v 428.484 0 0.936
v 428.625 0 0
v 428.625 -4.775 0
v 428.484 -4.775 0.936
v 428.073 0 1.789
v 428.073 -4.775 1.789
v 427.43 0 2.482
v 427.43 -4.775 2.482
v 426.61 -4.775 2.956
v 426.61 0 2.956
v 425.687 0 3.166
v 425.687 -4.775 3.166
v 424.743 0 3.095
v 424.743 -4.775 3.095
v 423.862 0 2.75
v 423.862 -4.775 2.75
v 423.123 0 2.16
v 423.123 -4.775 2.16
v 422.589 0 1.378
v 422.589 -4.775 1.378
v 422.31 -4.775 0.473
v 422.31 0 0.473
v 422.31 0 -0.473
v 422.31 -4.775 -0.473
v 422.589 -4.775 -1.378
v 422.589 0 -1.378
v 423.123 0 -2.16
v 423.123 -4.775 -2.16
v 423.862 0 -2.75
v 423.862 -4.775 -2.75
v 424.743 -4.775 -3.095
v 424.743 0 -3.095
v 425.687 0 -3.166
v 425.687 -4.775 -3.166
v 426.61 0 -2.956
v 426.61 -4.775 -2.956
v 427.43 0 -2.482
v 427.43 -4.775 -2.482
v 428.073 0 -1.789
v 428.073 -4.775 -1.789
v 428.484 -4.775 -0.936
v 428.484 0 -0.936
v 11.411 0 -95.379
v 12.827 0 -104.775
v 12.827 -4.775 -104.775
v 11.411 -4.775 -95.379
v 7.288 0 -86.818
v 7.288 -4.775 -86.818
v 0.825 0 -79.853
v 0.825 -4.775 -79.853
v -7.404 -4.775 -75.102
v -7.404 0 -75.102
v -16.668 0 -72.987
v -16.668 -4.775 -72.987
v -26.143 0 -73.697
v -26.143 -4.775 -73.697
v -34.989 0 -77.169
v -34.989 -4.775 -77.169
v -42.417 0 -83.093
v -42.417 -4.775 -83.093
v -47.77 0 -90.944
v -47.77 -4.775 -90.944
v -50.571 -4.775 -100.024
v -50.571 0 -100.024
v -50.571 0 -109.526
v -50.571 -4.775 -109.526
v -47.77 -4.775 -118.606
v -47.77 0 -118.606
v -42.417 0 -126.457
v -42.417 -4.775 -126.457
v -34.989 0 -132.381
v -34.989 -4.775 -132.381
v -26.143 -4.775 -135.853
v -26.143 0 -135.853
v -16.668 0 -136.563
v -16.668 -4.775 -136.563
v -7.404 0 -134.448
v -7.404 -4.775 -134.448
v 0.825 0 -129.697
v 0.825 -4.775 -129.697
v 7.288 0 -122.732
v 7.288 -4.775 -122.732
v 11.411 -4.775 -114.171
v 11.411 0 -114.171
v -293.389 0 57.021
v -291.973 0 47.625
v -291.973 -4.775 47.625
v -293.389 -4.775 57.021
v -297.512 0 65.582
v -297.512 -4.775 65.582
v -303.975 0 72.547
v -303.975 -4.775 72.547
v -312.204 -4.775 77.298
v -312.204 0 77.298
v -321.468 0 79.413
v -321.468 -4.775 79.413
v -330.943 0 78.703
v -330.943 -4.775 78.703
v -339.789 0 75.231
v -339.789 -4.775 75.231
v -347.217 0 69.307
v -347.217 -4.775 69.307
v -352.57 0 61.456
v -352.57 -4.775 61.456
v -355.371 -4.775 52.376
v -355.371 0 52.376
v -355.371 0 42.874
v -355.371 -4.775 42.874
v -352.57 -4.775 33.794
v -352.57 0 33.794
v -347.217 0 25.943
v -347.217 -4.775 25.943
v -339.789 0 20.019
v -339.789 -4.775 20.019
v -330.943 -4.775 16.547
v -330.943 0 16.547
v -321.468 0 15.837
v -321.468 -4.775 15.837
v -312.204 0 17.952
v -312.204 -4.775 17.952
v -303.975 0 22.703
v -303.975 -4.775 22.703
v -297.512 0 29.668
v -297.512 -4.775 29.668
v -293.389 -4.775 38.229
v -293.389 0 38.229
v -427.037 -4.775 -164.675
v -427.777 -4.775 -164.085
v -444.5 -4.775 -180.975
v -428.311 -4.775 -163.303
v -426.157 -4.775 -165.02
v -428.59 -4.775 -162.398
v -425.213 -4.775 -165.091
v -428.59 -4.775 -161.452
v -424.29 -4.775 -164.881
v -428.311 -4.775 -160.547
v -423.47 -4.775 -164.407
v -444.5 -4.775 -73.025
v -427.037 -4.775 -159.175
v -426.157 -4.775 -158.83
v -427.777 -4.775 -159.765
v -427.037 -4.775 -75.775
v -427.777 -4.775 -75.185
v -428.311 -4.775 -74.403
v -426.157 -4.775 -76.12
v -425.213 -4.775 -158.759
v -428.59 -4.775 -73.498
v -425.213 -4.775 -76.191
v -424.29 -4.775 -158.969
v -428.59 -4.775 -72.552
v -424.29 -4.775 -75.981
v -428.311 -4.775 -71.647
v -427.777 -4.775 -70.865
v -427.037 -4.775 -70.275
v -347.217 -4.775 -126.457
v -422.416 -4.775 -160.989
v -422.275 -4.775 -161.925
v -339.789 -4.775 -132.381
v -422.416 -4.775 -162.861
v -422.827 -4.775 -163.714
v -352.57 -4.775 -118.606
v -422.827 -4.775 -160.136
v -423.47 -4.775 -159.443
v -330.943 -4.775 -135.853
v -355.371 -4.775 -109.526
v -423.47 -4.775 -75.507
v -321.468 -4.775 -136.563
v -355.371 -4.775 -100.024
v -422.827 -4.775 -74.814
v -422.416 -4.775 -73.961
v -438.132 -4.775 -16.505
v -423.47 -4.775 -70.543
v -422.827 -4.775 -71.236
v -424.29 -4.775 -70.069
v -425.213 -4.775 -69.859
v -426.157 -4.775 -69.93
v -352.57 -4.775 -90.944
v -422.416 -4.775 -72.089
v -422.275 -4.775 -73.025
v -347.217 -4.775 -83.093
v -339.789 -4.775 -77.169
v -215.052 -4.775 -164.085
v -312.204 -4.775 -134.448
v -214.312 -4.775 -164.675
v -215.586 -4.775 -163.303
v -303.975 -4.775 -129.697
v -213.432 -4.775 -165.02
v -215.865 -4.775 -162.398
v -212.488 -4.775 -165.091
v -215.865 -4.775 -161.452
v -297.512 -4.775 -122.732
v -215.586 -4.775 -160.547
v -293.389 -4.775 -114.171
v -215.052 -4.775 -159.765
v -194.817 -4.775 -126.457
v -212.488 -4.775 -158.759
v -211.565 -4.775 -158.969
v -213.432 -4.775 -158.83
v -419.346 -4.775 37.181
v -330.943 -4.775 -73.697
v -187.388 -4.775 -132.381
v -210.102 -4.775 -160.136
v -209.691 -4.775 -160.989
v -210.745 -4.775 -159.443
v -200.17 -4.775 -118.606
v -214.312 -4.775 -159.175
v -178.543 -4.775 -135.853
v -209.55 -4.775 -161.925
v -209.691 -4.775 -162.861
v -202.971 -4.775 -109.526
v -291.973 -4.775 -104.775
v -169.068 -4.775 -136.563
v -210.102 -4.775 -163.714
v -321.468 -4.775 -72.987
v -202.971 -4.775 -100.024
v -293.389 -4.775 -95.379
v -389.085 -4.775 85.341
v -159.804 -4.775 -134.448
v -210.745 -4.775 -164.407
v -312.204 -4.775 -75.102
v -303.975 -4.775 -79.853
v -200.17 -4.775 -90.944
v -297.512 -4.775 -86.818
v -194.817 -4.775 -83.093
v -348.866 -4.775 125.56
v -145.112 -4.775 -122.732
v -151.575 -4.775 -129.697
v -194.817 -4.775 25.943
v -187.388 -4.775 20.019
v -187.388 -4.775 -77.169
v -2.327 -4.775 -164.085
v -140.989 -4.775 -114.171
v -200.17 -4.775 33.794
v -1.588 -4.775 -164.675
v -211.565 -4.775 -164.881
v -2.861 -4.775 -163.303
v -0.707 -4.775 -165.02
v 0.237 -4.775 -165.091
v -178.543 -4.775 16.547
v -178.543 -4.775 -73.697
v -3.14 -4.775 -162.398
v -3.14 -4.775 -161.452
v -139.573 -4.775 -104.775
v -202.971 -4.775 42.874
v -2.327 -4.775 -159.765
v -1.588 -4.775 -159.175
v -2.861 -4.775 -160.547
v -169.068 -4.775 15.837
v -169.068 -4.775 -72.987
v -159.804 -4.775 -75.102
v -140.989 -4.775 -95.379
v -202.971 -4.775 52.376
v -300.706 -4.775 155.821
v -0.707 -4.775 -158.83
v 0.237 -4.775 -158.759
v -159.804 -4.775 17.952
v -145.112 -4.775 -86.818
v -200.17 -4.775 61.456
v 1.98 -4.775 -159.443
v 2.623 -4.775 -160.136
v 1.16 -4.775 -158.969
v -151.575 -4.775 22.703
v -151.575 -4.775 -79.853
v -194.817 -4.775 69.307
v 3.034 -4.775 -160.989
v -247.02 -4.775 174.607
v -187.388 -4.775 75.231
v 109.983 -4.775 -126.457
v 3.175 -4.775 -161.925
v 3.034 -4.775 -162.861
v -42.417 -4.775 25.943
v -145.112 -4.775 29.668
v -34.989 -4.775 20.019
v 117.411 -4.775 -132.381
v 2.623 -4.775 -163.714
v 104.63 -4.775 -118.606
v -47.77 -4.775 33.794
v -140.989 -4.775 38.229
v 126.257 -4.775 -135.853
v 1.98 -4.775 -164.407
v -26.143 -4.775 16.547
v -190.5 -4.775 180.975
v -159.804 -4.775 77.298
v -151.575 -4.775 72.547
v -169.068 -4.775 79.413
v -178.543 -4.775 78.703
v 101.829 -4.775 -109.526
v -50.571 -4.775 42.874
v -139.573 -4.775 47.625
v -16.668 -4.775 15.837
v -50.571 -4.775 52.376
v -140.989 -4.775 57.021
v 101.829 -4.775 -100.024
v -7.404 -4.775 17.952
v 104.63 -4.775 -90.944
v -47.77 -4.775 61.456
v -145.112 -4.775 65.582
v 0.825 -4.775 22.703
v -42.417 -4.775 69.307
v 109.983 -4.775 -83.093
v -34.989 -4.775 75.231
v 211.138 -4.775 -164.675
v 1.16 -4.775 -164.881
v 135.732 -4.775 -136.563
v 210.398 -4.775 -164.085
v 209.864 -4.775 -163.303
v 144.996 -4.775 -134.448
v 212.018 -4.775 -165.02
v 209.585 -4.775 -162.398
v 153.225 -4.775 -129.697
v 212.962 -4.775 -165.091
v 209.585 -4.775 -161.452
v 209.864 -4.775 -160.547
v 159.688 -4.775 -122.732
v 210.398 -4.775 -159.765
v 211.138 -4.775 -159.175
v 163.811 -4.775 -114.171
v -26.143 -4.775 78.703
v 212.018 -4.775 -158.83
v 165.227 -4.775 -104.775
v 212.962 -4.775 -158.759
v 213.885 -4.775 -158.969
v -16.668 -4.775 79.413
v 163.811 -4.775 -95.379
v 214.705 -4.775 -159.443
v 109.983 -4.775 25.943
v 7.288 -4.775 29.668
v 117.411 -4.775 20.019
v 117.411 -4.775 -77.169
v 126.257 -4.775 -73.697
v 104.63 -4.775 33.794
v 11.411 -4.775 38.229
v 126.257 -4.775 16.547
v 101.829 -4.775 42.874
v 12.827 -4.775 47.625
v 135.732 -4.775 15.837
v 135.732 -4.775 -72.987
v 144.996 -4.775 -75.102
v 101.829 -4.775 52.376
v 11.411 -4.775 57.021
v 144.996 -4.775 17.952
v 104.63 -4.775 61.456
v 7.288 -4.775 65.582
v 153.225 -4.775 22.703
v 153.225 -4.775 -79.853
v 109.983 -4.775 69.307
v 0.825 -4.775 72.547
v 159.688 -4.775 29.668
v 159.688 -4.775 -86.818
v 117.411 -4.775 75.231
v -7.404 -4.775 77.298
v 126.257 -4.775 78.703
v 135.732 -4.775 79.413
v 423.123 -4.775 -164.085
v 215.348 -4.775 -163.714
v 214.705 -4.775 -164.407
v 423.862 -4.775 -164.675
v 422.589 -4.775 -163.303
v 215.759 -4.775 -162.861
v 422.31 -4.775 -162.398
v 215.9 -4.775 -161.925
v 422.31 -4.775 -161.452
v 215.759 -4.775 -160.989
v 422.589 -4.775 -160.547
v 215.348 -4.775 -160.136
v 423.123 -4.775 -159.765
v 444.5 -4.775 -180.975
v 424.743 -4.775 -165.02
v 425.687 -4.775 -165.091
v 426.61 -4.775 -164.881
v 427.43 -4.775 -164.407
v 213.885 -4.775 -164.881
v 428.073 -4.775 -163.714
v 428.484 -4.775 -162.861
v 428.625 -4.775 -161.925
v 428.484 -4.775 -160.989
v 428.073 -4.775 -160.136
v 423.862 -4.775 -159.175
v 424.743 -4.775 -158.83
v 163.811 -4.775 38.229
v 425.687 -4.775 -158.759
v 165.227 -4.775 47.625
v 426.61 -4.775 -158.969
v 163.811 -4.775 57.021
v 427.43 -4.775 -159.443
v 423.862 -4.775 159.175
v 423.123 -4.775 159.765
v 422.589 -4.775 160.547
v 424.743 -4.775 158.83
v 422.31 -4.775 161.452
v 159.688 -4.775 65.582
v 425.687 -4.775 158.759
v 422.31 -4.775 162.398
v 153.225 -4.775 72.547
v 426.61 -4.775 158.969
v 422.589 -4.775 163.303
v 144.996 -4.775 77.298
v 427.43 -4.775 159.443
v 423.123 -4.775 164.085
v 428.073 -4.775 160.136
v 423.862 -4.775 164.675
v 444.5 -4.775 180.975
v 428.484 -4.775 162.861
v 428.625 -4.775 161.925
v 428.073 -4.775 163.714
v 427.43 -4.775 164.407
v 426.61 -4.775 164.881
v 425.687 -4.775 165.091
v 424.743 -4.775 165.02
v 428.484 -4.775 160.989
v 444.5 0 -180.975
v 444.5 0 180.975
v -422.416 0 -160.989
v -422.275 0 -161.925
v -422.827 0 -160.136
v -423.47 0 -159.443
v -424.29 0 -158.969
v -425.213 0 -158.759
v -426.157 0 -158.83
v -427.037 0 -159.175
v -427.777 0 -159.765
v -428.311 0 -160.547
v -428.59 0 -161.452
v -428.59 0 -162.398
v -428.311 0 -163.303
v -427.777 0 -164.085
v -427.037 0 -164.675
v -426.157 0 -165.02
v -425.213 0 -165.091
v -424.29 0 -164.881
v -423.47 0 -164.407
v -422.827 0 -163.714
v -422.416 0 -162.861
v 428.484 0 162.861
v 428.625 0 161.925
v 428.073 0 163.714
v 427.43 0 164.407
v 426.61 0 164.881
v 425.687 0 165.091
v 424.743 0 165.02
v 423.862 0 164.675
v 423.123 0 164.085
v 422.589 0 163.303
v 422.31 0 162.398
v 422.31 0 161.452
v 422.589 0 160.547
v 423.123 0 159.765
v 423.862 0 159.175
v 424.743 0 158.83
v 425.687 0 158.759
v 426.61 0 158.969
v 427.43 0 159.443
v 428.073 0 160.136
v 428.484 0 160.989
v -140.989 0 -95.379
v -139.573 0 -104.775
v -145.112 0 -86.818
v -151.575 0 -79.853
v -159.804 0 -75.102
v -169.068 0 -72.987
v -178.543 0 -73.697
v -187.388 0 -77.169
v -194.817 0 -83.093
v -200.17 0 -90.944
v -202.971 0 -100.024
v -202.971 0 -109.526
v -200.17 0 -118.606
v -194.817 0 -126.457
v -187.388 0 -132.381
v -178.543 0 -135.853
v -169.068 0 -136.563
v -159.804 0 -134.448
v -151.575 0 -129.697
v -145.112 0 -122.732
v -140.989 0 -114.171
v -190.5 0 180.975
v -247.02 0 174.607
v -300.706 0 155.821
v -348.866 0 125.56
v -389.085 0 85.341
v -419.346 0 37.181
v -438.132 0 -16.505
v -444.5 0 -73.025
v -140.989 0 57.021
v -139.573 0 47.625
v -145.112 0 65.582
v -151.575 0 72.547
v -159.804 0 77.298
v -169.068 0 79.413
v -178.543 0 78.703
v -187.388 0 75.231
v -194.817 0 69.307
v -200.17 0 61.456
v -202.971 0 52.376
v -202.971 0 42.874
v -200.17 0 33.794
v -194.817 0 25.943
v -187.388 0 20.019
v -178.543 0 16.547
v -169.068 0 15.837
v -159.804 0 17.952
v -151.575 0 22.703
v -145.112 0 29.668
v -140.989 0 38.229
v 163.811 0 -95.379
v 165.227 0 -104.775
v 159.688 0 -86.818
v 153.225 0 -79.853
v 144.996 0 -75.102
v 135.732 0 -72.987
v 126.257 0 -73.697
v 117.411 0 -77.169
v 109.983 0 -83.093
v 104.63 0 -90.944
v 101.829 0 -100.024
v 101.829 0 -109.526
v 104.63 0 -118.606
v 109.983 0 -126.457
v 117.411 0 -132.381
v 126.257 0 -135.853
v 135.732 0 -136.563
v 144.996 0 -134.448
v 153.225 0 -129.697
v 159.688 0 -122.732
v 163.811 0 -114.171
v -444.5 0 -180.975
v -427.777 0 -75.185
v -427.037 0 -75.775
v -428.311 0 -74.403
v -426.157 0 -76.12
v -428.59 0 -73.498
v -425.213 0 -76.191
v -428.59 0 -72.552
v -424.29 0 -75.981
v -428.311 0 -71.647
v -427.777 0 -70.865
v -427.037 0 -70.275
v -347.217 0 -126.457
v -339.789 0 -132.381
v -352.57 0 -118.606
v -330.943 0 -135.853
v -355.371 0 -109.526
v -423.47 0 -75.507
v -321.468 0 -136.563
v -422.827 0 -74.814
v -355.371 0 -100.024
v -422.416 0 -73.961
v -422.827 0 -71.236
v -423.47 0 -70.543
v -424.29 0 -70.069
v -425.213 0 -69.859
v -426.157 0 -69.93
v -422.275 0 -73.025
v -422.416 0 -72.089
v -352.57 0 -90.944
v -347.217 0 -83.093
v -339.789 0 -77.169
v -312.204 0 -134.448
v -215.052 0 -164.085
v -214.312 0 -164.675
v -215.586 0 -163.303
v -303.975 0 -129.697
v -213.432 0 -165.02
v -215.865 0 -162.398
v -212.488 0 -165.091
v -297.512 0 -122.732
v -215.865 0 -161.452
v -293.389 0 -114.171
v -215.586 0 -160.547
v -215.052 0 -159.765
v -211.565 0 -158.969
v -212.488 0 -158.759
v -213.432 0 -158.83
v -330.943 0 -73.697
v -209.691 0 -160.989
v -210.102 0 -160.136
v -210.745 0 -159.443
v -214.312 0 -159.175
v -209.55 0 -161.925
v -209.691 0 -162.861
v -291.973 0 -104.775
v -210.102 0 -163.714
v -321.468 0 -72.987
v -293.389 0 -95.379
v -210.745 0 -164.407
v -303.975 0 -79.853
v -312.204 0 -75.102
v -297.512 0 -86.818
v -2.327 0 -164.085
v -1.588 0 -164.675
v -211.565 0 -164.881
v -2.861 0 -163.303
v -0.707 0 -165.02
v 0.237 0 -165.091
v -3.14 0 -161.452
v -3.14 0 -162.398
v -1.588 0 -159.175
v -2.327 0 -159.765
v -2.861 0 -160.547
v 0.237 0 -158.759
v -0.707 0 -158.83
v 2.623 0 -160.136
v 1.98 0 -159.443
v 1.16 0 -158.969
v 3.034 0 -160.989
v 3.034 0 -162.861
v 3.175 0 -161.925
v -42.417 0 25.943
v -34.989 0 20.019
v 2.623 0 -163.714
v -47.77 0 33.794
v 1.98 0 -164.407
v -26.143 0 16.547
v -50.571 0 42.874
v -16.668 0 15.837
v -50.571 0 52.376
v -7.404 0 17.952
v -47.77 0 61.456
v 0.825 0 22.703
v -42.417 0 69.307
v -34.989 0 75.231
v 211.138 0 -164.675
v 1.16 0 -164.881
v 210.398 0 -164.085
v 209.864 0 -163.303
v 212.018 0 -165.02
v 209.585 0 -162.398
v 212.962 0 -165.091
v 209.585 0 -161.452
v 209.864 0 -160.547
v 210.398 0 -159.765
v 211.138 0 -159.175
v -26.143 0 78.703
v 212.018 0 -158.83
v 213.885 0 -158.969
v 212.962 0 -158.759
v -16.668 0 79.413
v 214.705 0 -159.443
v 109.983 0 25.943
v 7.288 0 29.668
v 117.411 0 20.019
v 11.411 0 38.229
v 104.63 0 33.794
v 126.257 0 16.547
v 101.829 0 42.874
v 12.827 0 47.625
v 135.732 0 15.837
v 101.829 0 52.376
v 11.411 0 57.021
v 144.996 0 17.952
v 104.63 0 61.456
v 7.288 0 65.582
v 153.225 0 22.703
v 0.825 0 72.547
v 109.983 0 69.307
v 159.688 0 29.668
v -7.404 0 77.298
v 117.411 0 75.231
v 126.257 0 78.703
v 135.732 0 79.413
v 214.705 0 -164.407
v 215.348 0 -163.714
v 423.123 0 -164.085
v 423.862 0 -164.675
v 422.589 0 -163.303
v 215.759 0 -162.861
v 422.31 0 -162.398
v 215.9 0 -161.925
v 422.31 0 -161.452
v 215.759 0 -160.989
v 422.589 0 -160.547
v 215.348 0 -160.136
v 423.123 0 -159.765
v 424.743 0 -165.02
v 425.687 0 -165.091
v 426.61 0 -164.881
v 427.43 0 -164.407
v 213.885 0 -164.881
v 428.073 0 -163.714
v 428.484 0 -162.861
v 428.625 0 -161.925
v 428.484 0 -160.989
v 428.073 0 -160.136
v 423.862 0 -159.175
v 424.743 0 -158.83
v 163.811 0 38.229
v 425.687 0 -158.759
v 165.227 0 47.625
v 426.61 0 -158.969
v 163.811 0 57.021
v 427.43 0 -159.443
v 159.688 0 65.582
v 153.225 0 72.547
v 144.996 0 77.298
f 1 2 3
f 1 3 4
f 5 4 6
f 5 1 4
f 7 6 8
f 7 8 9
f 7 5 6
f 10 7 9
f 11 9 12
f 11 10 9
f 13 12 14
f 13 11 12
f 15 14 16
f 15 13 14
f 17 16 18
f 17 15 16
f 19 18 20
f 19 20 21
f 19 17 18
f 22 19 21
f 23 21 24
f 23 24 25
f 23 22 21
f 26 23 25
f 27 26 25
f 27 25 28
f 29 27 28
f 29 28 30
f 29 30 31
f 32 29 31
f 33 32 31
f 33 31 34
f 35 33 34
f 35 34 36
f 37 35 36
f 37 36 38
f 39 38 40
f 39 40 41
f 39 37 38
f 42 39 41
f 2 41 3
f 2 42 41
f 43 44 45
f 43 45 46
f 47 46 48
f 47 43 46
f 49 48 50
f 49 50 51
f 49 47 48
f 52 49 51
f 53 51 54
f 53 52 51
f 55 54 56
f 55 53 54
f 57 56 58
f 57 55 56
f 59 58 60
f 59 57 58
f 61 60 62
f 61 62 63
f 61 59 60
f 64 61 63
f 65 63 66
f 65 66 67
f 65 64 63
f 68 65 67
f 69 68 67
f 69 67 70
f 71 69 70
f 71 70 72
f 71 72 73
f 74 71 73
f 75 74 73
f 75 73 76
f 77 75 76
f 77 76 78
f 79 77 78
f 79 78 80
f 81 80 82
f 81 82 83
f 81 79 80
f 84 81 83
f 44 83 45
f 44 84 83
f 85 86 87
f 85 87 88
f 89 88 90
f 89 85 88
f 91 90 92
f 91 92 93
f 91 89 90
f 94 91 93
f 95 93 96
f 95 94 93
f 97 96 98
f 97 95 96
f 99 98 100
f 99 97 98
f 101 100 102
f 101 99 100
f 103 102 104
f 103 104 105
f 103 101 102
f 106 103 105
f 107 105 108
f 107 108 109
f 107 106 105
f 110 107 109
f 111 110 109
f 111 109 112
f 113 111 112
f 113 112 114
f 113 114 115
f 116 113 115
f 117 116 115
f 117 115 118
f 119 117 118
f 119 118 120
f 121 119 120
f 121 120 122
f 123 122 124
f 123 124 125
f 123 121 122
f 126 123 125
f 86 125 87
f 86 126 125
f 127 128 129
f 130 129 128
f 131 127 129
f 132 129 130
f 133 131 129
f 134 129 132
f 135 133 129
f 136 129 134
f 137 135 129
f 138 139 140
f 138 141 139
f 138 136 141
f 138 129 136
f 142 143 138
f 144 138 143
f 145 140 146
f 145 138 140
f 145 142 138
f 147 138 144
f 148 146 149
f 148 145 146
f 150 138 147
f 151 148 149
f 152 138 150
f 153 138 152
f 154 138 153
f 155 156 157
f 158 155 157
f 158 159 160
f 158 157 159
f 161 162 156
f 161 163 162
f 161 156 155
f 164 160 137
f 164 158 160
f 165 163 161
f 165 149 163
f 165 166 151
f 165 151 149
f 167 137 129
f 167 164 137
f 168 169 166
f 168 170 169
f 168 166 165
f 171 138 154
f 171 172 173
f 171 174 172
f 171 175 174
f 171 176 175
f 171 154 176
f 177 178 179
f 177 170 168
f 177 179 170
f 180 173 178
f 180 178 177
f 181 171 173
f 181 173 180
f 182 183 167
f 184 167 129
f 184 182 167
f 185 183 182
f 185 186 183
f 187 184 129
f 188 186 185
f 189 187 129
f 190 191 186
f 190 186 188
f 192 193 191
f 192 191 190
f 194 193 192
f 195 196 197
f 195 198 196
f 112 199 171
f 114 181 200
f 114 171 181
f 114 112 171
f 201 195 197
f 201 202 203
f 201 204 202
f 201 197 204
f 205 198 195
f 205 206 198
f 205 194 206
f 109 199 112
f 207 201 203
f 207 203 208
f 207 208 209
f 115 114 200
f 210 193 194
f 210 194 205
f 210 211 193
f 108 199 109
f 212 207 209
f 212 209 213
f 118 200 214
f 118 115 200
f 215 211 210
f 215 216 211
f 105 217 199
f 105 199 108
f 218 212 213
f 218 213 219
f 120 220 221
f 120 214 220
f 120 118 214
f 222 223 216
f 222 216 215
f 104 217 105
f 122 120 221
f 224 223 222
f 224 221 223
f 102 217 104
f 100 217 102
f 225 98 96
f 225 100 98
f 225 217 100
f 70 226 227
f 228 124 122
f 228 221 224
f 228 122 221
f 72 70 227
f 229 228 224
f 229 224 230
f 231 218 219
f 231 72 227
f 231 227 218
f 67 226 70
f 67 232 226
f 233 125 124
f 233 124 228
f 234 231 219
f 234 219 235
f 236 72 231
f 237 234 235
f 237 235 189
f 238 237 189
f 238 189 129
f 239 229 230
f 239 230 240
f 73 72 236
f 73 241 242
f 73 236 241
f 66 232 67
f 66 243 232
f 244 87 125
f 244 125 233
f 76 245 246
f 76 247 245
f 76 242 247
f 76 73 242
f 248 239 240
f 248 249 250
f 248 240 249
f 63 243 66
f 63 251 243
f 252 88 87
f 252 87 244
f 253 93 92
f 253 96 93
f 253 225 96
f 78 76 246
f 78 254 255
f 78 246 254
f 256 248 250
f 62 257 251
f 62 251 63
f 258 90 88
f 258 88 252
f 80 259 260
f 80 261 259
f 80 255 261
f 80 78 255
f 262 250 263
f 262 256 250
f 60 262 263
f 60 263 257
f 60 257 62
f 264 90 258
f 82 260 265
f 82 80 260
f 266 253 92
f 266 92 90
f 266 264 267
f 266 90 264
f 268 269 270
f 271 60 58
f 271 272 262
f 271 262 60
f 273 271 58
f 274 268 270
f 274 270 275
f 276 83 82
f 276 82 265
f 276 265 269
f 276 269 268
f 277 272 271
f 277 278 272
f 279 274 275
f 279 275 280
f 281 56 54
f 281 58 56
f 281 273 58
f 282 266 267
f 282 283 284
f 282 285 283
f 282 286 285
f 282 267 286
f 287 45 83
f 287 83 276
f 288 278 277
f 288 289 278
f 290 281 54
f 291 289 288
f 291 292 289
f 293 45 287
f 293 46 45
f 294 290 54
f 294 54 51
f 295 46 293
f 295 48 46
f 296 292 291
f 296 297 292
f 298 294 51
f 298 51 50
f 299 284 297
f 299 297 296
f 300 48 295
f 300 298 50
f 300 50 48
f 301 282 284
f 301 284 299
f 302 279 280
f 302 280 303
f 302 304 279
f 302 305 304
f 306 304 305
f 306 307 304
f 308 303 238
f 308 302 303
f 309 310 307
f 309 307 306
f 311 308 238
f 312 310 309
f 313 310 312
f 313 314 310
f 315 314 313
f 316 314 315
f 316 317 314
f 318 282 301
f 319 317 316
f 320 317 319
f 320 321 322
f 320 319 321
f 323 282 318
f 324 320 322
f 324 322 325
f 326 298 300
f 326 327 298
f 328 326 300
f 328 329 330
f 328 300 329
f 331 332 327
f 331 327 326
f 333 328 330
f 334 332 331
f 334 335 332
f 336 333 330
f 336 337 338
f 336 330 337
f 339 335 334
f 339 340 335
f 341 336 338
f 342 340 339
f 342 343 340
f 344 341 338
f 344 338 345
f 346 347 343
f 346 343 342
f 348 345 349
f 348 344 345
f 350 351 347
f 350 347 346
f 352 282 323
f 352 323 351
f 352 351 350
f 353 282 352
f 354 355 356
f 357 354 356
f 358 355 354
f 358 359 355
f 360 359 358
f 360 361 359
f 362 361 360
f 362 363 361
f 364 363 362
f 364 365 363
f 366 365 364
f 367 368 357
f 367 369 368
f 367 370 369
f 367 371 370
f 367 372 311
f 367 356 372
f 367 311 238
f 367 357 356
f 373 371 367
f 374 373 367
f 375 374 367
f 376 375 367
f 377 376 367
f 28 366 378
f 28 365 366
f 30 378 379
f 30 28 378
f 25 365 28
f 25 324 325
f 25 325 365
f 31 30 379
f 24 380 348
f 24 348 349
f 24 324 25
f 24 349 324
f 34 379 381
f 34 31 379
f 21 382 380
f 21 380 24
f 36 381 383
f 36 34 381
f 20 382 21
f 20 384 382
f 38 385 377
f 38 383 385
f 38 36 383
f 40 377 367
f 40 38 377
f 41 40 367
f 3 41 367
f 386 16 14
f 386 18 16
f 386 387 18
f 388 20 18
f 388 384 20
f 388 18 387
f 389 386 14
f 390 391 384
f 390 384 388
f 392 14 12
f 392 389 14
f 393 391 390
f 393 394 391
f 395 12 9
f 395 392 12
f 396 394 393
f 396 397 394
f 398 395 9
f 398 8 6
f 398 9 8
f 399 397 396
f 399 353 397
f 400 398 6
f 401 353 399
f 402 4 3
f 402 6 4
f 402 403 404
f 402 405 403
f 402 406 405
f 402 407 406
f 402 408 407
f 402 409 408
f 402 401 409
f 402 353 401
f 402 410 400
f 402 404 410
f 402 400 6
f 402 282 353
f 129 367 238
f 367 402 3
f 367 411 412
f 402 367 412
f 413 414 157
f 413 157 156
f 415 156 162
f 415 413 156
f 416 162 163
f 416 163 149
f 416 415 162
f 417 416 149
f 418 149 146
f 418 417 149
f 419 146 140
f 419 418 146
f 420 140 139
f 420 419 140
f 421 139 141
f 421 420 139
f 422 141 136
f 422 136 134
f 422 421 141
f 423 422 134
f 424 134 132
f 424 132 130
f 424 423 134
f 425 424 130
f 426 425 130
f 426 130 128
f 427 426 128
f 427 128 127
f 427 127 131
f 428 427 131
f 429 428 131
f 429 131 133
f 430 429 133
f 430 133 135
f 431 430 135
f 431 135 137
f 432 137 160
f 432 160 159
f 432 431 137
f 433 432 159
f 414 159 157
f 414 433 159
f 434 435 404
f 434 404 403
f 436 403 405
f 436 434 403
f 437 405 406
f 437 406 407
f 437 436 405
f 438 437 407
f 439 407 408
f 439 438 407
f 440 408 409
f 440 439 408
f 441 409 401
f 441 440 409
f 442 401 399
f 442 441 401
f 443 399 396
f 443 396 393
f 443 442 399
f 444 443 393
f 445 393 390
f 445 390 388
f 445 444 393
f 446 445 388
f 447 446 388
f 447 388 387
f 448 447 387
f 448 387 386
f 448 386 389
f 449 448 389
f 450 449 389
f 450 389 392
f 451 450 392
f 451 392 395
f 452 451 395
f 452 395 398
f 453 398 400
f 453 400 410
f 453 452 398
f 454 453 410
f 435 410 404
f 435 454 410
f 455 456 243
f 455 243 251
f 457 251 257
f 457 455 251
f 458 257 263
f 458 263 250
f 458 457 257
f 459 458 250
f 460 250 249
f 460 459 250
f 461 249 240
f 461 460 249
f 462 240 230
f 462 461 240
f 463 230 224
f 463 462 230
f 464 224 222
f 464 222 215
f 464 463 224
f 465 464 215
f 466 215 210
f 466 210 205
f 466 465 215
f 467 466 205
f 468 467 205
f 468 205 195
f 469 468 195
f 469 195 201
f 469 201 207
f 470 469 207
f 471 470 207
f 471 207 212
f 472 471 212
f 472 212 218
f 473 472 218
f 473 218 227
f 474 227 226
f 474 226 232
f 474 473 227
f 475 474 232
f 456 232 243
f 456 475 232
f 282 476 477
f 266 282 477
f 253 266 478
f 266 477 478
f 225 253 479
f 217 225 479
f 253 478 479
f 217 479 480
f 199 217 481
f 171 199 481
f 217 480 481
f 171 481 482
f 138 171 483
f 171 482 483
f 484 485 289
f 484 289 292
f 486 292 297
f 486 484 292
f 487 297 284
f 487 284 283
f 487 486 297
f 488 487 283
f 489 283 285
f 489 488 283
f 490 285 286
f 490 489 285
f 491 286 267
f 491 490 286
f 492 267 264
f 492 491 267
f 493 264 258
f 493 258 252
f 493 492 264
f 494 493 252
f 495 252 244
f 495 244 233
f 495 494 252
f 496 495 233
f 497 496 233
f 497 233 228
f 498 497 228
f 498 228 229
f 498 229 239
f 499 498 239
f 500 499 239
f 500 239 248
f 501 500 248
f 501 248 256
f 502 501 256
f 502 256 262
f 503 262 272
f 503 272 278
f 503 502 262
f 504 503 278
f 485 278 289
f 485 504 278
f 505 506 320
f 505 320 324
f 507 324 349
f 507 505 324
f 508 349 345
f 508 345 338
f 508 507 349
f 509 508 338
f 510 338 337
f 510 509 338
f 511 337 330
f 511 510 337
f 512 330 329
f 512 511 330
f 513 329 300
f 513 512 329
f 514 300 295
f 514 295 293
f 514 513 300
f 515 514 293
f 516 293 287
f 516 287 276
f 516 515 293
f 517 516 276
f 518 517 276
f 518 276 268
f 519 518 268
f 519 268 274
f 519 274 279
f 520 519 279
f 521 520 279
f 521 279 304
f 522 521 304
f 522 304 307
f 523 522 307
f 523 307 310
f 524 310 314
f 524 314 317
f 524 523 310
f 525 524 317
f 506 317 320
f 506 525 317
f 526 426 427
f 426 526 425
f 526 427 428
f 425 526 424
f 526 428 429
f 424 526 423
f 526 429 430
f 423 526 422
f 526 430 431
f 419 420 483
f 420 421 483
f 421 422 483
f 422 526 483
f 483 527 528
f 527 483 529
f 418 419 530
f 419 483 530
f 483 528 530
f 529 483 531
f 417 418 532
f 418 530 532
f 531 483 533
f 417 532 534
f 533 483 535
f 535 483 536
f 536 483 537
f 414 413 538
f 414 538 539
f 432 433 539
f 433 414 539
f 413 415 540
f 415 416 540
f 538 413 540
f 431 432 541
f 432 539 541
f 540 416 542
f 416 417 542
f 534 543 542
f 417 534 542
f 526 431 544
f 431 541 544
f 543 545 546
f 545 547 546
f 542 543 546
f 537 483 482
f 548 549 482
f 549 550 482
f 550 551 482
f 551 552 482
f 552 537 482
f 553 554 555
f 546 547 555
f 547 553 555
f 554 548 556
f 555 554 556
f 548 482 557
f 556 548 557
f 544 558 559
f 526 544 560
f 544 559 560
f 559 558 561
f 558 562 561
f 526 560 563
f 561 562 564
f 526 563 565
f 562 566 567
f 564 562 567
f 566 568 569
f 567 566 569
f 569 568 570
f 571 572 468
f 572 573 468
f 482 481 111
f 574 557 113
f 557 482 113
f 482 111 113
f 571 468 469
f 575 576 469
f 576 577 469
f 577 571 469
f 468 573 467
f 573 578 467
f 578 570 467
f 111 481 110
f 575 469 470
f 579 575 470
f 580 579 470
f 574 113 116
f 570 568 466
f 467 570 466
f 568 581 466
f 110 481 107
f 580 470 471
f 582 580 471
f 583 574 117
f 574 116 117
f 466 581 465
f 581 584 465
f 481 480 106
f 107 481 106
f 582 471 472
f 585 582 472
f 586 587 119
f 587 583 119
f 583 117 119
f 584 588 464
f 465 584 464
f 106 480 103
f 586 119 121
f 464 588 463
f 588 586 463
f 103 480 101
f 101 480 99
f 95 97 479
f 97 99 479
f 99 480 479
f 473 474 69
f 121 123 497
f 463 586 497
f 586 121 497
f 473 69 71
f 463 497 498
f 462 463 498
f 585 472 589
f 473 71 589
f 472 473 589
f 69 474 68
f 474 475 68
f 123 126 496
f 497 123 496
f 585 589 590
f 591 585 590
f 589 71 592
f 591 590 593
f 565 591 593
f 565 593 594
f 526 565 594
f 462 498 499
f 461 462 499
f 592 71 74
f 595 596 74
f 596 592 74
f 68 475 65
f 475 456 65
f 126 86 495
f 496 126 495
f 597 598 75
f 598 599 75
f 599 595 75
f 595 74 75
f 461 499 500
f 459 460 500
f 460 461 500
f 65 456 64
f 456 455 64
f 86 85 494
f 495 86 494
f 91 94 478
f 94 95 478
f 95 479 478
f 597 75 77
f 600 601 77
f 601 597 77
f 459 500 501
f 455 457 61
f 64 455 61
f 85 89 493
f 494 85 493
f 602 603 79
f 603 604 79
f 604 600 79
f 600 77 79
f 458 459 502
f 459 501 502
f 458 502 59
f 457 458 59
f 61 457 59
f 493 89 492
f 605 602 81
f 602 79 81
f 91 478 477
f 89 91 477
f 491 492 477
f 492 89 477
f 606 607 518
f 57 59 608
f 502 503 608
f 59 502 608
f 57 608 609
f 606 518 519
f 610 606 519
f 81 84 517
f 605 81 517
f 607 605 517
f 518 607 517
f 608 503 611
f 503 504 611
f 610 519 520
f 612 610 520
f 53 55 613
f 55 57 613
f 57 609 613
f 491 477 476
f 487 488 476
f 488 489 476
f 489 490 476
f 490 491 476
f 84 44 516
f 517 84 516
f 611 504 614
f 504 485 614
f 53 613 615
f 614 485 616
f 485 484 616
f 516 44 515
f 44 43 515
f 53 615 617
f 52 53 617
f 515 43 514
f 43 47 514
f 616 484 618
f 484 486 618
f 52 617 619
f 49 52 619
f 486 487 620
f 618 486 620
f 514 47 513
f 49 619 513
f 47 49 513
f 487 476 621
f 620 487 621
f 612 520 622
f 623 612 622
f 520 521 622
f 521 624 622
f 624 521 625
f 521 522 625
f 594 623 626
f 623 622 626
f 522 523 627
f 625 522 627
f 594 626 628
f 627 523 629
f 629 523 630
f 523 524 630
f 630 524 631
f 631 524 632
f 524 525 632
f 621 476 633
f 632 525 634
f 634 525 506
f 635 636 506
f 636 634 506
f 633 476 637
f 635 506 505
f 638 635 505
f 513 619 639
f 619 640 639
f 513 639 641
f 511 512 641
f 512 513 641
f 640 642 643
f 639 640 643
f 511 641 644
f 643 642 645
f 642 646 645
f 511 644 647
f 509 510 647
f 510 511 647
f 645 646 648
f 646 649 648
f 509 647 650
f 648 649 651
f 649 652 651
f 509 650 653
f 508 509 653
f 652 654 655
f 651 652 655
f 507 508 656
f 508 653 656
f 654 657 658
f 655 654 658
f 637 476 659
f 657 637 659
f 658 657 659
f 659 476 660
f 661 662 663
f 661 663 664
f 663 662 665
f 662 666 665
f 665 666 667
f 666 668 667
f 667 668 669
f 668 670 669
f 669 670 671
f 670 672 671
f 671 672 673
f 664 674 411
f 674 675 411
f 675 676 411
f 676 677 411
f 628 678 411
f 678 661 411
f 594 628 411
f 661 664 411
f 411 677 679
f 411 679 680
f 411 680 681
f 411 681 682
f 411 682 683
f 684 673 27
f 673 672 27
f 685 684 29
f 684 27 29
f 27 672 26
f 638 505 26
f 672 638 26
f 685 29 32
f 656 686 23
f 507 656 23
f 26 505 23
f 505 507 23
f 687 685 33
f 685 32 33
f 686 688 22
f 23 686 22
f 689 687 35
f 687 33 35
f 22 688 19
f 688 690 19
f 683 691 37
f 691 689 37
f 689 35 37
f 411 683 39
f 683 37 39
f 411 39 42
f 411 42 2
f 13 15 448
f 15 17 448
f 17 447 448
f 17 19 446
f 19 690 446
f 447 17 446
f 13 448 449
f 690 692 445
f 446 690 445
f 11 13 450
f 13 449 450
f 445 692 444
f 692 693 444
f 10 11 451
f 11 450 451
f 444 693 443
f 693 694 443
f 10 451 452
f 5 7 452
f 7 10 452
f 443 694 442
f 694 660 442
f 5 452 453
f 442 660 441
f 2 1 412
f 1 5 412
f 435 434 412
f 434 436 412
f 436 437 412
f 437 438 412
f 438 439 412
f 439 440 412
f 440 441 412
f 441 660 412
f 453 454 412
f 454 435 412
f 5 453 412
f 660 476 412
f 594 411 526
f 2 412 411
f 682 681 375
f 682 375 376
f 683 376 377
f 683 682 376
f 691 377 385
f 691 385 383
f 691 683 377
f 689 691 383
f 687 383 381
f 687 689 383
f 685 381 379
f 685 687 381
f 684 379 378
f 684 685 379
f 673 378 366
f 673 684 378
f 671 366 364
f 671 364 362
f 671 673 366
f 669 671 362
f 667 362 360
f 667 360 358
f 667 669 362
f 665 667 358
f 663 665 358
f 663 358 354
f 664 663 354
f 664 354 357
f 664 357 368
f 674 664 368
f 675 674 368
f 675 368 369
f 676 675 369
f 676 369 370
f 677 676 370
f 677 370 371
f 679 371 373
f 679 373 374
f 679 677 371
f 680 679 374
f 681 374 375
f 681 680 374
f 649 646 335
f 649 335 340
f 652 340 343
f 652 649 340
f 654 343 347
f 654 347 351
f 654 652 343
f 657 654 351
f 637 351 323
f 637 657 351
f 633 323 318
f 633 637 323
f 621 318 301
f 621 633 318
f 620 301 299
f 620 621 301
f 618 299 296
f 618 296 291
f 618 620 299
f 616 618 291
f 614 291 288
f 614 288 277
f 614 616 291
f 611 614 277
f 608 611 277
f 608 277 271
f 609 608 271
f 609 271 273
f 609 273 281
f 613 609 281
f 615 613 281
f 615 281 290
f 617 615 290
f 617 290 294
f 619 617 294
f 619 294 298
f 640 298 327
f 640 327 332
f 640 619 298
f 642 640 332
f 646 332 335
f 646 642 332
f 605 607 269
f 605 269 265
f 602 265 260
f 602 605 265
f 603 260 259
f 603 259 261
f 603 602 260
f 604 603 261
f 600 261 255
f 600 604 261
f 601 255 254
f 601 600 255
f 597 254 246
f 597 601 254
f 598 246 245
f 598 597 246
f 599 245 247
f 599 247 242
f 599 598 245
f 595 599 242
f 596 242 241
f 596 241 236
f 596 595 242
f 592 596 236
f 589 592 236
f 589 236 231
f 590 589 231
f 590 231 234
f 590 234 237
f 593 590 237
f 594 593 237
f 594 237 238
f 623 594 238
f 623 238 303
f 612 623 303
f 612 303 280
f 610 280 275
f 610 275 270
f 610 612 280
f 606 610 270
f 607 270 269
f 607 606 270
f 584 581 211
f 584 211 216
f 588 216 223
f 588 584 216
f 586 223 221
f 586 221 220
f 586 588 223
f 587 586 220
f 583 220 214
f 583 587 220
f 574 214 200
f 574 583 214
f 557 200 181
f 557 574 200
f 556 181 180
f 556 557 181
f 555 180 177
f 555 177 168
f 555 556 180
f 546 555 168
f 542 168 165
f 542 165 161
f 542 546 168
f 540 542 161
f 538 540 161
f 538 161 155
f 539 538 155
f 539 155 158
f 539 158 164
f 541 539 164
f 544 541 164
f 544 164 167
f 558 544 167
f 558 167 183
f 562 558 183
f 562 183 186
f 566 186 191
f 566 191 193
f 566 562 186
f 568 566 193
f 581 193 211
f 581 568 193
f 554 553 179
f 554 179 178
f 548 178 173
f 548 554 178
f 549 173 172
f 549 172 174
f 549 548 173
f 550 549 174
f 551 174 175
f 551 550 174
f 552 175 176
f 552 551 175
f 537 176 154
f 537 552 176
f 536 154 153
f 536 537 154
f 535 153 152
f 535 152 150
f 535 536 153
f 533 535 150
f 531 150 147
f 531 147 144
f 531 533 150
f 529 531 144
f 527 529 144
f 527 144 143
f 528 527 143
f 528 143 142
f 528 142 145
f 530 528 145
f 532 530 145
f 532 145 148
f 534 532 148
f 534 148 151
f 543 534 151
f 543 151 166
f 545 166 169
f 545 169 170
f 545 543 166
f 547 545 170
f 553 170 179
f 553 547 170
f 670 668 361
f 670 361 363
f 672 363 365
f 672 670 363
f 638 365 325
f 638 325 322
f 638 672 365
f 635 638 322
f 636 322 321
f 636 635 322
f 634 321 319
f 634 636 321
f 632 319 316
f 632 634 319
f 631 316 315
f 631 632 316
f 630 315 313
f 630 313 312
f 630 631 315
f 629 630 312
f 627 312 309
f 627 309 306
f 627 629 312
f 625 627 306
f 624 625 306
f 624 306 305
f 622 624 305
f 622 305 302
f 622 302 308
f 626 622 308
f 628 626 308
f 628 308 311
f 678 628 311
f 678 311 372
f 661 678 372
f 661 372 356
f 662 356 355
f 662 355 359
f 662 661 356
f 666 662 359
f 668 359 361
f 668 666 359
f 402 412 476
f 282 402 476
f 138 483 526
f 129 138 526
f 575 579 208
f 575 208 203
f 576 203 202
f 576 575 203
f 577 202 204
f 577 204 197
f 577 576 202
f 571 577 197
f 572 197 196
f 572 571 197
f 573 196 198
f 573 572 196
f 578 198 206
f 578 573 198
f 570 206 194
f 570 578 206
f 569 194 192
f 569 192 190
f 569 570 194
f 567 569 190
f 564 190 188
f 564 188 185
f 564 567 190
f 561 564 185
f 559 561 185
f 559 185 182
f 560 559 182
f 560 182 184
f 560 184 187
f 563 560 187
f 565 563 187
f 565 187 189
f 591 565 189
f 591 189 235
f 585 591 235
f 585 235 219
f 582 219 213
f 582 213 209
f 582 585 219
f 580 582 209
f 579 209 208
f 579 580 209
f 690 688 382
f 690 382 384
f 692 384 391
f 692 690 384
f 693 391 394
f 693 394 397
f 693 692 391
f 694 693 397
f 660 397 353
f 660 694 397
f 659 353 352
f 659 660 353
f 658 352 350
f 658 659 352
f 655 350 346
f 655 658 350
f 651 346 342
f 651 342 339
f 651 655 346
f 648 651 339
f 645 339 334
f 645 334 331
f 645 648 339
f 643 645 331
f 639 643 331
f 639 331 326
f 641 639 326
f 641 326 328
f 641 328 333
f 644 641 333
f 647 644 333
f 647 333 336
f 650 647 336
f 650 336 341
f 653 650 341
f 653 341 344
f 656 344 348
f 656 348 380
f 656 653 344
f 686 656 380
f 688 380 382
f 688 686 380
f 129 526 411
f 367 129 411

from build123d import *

# Parameters (mm, degrees)
F0_R     = 3.175
F0_R_2   = 31.877
F1_DEPTH = 4.7752


with BuildPart() as f1:
    # F0 (on Front) → F1 (new body)
    with BuildSketch(Plane.XZ):
        with BuildLine():
            Line((444.5, 180.975), (-190.5, 180.975))
            ThreePointArc((-190.5, 180.975), (-370.105122, 106.580122), (-444.5, -73.025))
            Line((-444.5, -73.025), (-444.5, -180.975))
            Line((-444.5, -180.975), (444.5, -180.975))
            Line((444.5, -180.975), (444.5, 180.975))
        make_face()
        with Locations((-425.45, -161.925)):
            Circle(F0_R, mode=Mode.SUBTRACT)
        with Locations((-323.85, -104.775)):
            Circle(F0_R_2, mode=Mode.SUBTRACT)
        with Locations((-212.725, -161.925)):
            Circle(F0_R, mode=Mode.SUBTRACT)
        with Locations((-171.45, -104.775)):
            Circle(F0_R_2, mode=Mode.SUBTRACT)
        with Locations((-19.05, -104.775)):
            Circle(F0_R_2, mode=Mode.SUBTRACT)
        with Locations((-425.45, -73.025)):
            Circle(F0_R, mode=Mode.SUBTRACT)
        with Locations((0, -161.925)):
            Circle(F0_R, mode=Mode.SUBTRACT)
        with Locations((212.725, -161.925)):
            Circle(F0_R, mode=Mode.SUBTRACT)
        with Locations((133.35, -104.775)):
            Circle(F0_R_2, mode=Mode.SUBTRACT)
        with Locations((425.45, -161.925)):
            Circle(F0_R, mode=Mode.SUBTRACT)
        with Locations((-323.85, 47.625)):
            Circle(F0_R_2, mode=Mode.SUBTRACT)
        with Locations((-171.45, 47.625)):
            Circle(F0_R_2, mode=Mode.SUBTRACT)
        with Locations((-19.05, 47.625)):
            Circle(F0_R_2, mode=Mode.SUBTRACT)
        with Locations((133.35, 47.625)):
            Circle(F0_R_2, mode=Mode.SUBTRACT)
        with Locations((425.45, 0)):
            Circle(F0_R, mode=Mode.SUBTRACT)
        with Locations((425.45, 161.925)):
            Circle(F0_R, mode=Mode.SUBTRACT)
    extrude(amount=F1_DEPTH)


solid = f1.part
